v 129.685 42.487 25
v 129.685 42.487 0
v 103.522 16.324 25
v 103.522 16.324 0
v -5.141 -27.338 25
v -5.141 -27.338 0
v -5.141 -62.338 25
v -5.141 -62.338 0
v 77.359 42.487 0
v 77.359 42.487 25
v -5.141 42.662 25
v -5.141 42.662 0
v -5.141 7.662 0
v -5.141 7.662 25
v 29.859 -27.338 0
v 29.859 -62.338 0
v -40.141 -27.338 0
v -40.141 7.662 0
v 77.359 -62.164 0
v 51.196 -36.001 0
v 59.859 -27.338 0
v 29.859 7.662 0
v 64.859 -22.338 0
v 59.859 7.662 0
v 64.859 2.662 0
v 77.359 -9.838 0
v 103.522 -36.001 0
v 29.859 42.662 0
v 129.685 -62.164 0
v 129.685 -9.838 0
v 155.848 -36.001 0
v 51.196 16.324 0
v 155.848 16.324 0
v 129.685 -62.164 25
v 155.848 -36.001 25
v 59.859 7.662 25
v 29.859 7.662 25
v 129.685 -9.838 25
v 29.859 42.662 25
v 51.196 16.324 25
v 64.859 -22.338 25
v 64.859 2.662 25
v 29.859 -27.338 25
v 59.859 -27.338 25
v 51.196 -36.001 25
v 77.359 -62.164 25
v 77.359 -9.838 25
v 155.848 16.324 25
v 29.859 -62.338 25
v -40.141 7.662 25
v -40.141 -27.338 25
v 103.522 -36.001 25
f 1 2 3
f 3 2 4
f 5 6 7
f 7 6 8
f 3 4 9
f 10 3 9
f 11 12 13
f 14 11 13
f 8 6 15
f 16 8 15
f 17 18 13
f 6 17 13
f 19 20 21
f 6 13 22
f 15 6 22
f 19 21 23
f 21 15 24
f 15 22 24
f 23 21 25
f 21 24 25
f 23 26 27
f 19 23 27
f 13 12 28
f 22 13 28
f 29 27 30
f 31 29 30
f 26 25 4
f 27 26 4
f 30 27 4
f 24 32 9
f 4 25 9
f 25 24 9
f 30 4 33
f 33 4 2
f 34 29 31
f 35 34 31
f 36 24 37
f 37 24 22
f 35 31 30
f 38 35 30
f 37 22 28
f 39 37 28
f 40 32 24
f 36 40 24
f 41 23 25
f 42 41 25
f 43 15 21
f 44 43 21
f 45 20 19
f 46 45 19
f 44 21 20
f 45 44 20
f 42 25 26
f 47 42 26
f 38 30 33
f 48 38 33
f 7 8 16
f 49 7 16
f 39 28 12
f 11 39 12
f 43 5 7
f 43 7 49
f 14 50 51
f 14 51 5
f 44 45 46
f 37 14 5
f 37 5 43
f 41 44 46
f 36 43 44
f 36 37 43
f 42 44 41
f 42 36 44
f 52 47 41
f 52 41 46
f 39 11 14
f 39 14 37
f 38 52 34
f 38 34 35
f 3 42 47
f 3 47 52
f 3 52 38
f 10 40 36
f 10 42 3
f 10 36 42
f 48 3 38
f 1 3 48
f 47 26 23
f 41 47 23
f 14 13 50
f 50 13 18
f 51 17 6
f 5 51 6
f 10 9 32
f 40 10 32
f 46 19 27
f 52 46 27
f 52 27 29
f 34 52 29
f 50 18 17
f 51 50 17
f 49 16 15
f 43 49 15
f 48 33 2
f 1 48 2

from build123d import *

# Parameters (mm, degrees)
F1_DEPTH = 25


with BuildPart() as f1:
    # F0 (on Top) → F1 (new body)
    with BuildSketch(Plane.XY):
        Polygon((29.8591275221, 42.6615241542), (-5.1408724779, 42.6615241542), (-5.1408724779, 7.6615241542), (-40.1408724779, 7.6615241542), (-40.1408724779, -27.3384758458), (-5.1408724779, -27.3384758458), (-5.1408724779, -62.3384758458), (29.8591275221, -62.3384758458), (29.8591275221, -27.3384758458), (29.8591275221, -9.8384758458), (29.8591275221, 7.6615241542), align=None)
        Polygon((59.8591275221, 7.6615241542), (29.8591275221, 7.6615241542), (29.8591275221, -9.8384758458), (64.8591275221, -9.8384758458), (64.8591275221, 2.6615241542), align=None)
        Polygon((64.8591275221, 7.6615241542), (59.8591275221, 7.6615241542), (64.8591275221, 2.6615241542), align=None)
        Polygon((64.8591275221, -22.3384758458), (59.8591275221, -27.3384758458), (64.8591275221, -27.3384758458), align=None)
        Polygon((64.8591275221, -9.8384758458), (29.8591275221, -9.8384758458), (29.8591275221, -27.3384758458), (59.8591275221, -27.3384758458), (64.8591275221, -22.3384758458), align=None)
        Polygon((51.1961766182, 16.3244750581), (59.8591275221, 7.6615241542), (64.8591275221, 7.6615241542), (64.8591275221, 2.6615241542), (77.3591275221, -9.8384758458), (103.522078426, -9.8384758458), (103.522078426, 16.3244750581), (77.3591275221, 42.4874259621), align=None)
        Polygon((103.522078426, -9.8384758458), (77.3591275221, -9.8384758458), (64.8591275221, -22.3384758458), (64.8591275221, -27.3384758458), (59.8591275221, -27.3384758458), (51.1961766182, -36.0014267497), (77.3591275221, -62.1643776536), (103.522078426, -36.0014267497), align=None)
        Polygon((103.522078426, 16.3244750581), (103.522078426, -9.8384758458), (129.6850293299, -9.8384758458), (155.8479802338, 16.3244750581), (129.6850293299, 42.4874259621), align=None)
        Polygon((129.6850293299, -9.8384758458), (103.522078426, -9.8384758458), (103.522078426, -36.0014267497), (129.6850293299, -62.1643776536), (155.8479802338, -36.0014267497), align=None)
    extrude(amount=F1_DEPTH)


solid = f1.part
